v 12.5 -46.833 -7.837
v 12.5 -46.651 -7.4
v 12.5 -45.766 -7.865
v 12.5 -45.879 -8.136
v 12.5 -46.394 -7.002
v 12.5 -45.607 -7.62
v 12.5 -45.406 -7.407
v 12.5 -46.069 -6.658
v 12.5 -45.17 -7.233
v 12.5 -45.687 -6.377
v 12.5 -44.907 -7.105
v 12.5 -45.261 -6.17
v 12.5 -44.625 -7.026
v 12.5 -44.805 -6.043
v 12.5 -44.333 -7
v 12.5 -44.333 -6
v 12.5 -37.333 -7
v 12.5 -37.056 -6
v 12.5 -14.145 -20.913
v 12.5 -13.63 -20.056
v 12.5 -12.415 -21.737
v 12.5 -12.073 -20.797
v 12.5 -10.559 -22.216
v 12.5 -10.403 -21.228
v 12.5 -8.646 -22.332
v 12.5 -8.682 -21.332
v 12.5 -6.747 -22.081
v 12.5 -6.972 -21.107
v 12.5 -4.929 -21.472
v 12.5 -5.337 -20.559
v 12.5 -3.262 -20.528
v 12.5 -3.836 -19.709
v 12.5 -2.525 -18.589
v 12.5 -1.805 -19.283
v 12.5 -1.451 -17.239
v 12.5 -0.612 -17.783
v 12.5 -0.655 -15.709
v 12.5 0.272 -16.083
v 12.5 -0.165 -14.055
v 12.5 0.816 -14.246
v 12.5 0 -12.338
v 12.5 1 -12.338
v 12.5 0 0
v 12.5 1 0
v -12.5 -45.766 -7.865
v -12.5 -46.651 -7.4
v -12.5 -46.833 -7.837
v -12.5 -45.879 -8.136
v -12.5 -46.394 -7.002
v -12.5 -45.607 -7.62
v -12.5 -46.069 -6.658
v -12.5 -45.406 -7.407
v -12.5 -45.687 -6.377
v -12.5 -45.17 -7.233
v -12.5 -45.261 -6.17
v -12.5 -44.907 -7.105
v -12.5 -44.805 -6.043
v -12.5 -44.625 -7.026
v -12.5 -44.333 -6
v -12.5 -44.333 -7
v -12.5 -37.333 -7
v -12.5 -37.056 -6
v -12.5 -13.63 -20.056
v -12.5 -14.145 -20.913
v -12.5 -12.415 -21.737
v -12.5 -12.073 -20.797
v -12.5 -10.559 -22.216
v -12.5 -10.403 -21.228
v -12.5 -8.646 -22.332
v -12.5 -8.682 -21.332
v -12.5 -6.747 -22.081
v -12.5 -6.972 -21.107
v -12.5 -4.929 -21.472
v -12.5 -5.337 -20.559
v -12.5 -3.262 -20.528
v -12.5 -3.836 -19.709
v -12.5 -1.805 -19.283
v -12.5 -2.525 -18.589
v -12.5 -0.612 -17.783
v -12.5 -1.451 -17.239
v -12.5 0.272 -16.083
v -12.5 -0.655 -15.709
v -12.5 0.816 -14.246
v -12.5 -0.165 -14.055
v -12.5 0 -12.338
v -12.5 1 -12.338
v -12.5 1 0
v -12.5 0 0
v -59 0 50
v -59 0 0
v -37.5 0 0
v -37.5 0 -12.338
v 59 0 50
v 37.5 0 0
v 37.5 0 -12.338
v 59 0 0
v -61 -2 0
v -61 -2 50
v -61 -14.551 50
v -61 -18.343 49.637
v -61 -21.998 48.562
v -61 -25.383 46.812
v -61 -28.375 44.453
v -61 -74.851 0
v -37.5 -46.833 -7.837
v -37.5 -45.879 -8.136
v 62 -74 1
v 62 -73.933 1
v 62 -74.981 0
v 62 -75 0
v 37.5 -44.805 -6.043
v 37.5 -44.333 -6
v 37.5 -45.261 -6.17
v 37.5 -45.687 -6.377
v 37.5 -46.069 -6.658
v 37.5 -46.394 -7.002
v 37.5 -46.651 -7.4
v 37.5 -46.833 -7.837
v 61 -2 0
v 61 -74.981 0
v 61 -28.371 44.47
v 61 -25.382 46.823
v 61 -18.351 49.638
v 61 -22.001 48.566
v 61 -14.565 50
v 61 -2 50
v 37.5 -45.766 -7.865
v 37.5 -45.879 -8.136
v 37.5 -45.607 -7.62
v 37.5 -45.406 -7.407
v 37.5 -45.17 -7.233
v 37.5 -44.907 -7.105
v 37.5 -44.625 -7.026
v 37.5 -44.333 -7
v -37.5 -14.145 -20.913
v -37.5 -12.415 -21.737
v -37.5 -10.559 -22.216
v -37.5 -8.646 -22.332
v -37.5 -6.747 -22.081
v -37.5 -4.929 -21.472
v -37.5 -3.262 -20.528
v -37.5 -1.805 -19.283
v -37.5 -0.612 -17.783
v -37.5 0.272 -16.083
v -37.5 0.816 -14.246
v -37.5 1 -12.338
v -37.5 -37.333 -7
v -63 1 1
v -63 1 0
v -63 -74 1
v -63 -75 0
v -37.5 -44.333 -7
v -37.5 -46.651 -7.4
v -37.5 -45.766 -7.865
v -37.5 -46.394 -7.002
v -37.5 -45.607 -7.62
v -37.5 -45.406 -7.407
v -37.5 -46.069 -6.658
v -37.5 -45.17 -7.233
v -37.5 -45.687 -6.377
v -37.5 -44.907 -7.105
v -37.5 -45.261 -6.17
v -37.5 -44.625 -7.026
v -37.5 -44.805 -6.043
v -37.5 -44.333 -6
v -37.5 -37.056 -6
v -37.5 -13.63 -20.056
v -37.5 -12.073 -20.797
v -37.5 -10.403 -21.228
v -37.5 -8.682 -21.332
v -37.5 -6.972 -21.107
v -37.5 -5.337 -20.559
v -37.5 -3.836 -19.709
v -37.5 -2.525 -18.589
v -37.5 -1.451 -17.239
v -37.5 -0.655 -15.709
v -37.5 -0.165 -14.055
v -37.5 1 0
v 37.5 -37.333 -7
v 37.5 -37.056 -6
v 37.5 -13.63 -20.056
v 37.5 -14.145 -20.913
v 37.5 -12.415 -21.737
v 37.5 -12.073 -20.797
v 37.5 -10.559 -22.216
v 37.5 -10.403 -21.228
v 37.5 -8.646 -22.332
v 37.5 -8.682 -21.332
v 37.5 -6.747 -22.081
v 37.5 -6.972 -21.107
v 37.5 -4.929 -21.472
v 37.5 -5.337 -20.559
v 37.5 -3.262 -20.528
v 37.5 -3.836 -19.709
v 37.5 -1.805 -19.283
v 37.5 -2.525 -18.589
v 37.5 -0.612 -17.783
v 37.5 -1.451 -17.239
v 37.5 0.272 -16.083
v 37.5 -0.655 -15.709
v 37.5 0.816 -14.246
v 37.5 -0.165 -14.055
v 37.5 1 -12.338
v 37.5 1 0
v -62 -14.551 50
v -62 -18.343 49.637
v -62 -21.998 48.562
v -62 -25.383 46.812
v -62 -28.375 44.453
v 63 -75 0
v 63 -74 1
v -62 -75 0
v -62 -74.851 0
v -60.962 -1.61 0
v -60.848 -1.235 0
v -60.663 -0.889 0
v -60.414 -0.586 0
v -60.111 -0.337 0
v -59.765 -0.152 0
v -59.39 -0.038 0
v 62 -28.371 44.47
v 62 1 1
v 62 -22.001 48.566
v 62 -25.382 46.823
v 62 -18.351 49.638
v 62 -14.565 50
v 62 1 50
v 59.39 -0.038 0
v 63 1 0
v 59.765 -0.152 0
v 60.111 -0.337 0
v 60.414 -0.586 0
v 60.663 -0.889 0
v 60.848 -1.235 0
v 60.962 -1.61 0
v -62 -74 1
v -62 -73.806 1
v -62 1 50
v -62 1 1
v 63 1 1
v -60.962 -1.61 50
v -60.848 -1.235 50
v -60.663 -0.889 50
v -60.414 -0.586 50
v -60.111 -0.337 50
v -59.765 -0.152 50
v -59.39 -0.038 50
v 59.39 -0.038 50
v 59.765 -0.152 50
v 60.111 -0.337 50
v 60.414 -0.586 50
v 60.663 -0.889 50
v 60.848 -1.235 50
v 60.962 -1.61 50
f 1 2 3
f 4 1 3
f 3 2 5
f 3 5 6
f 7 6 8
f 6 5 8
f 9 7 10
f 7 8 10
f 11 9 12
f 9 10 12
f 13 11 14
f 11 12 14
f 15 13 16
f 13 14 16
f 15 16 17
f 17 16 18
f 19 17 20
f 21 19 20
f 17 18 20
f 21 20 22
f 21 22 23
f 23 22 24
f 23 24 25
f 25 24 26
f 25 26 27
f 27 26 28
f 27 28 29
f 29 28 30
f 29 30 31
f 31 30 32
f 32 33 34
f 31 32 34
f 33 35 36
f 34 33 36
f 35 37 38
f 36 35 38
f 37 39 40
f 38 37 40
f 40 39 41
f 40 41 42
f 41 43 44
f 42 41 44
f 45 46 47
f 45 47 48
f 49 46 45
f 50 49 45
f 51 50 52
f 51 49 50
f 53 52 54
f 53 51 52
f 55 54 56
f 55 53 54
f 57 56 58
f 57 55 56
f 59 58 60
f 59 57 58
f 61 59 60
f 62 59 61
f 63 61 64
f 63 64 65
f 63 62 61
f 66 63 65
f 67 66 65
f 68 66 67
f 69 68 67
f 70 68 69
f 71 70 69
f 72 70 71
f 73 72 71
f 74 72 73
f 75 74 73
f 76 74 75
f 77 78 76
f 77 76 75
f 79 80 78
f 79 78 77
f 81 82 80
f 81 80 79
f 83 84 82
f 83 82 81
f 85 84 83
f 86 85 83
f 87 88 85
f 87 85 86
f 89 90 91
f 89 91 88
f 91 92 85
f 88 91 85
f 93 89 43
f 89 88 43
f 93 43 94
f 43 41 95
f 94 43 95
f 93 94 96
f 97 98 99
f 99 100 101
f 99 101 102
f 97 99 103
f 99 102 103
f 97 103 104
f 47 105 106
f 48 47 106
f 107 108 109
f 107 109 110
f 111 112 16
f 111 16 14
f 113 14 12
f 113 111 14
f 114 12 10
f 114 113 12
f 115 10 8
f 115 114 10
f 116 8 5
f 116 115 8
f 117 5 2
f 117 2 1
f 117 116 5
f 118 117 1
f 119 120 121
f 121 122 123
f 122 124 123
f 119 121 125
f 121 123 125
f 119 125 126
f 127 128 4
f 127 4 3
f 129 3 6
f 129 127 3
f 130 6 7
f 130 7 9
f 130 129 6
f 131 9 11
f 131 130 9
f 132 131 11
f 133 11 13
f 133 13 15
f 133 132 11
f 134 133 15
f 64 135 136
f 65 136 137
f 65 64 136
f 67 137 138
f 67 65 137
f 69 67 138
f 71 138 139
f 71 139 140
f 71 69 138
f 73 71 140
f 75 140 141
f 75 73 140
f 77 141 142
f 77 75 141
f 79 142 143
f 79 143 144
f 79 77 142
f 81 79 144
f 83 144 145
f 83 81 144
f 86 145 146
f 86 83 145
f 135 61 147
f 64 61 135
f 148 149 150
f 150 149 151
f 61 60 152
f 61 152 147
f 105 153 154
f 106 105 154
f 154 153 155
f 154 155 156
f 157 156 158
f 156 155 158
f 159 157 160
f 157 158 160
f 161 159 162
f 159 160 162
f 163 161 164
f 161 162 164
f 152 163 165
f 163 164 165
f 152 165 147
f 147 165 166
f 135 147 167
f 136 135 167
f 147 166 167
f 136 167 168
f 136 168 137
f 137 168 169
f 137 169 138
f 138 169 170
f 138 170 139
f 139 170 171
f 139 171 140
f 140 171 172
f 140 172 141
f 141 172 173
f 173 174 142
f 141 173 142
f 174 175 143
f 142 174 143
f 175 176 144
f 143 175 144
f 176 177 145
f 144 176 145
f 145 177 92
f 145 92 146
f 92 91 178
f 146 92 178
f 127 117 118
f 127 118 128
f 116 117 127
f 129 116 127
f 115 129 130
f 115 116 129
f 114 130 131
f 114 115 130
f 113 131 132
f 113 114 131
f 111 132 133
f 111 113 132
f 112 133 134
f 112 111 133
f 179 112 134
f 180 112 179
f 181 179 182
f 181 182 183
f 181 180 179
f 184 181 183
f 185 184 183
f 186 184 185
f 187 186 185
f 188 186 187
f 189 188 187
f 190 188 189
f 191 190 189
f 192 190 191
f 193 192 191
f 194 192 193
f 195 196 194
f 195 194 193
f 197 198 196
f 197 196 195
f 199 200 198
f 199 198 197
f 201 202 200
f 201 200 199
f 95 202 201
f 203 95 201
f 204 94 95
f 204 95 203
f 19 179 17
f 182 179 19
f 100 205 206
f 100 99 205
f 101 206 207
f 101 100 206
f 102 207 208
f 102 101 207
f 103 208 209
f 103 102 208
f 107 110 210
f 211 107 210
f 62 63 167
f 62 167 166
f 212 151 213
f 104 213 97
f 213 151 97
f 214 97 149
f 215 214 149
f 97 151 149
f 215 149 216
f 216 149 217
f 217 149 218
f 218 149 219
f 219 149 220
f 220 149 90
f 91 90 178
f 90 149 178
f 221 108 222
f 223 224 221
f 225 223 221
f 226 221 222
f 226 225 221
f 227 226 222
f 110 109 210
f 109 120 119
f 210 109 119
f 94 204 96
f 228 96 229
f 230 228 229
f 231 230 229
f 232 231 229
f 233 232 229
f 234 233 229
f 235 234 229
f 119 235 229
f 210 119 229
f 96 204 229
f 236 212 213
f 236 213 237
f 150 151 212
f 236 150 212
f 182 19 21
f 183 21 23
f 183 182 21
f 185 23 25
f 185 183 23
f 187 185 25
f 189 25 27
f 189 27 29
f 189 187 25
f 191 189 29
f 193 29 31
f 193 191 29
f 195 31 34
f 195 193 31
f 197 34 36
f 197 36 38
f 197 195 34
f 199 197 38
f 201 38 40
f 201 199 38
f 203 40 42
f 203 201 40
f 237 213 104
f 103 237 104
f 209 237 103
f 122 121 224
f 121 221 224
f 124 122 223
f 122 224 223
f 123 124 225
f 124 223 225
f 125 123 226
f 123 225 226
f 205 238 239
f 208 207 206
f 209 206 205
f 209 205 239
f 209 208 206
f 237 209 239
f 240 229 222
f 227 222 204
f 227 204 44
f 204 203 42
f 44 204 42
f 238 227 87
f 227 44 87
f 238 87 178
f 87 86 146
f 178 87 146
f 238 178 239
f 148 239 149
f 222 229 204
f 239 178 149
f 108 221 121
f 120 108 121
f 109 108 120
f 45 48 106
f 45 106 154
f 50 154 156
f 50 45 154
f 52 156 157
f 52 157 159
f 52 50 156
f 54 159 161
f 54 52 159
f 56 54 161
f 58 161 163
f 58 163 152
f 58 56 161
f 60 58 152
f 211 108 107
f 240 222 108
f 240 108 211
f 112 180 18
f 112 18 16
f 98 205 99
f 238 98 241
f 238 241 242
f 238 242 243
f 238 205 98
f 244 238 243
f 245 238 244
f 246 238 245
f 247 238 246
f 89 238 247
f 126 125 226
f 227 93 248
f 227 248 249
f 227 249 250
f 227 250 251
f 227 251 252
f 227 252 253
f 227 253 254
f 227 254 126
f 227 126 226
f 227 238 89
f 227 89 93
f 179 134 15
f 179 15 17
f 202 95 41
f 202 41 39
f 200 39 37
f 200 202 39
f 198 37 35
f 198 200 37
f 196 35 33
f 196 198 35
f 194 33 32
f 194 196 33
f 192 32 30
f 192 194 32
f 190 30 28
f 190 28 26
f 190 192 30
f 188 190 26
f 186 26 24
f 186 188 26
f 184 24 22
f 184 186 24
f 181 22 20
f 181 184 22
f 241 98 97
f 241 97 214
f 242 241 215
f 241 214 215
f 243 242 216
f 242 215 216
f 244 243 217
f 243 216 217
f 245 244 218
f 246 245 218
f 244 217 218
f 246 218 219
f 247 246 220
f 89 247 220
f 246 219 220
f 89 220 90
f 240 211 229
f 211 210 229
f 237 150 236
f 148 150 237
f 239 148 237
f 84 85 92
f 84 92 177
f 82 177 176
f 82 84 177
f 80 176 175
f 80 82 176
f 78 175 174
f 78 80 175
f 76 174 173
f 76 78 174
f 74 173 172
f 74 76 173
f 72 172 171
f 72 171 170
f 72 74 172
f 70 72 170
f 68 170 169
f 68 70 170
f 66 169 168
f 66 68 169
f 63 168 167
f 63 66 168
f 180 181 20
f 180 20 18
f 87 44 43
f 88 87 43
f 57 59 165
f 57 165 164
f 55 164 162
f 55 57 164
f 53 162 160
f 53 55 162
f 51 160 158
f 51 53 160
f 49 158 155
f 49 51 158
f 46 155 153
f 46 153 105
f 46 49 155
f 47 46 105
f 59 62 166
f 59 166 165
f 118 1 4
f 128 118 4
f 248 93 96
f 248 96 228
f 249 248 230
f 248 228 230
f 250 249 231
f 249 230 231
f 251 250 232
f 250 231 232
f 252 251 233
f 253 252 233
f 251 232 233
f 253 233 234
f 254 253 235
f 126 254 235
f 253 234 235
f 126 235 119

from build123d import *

# Parameters (mm, degrees)
F1_DEPTH  = 50
F3_DEPTH  = 1
F5_DEPTH  = 1
F6_DEPTH  = 1
F7_SIZE   = 0.99999
F9_DEPTH  = 37.5
F10_DEPTH = 12.5
F11_R     = 20


# Not quite as in the source:
# - a fillet or chamfer is up to 0.001 mm smaller than in the source, because OpenCascade refuses the exact size


with BuildPart() as f1:
    # F0 (on Top) → F1 (new body)
    with BuildSketch(Plane.XY):
        with BuildLine():
            Line((-59, 0), (0, 0))
            Line((0, 0), (59, 0))
            ThreePointArc((59, 0), (60.4142135624, -0.5857864376), (61, -2))
            Line((61, -2), (61, -22.5753318518))
            Line((61, -22.5753318518), (62, -22.5753318518))
            Line((62, -22.5753318518), (62, 1))
            Line((62, 1), (0, 1))
            Line((0, 1), (-62, 1))
            Line((-62, 1), (-62, -22.5753318518))
            Line((-62, -22.5753318518), (-61, -22.5753318518))
            Line((-61, -22.5753318518), (-61, -2))
            ThreePointArc((-61, -2), (-60.4142135624, -0.5857864376), (-59, 0))
        make_face()
    extrude(amount=F1_DEPTH)

    # F2 (on face) → F3 (join)
    with BuildSketch(Plane(origin=(-62, 0, 0), x_dir=(0, -1, 0), z_dir=(-1, 0, 0))):
        Polygon((74.8511105776, 0), (22.5753318518, 50), (22.5753318518, 0), align=None)
    extrude(amount=-F3_DEPTH)

    # F4 (on face) → F5 (join)
    with BuildSketch(Plane.YZ.offset(62)):
        Polygon((-22.5753318518, 0), (-22.5753318518, 50), (-74.9809518456, 0), align=None)
    extrude(amount=-F5_DEPTH)

    # F0 (on Top) → F6 (join)
    with BuildSketch(Plane.XY):
        Polygon((62, 1), (62, -22.5753318518), (62, -75), (63, -75), (63, 1), align=None)
        Polygon((-62, -75), (-62, -22.5753318518), (-62, 1), (-63, 1), (-63, -75), align=None)
    extrude(amount=F6_DEPTH)

    # F7 (size 1 in the source; OpenCascade refuses exactly that, so slightly less here)
    f7_edges = [f1.edges().sort_by_distance(p)[0] for p in [
        (62.5, -75, 1),
        (-62.5, -75, 1),
    ]]
    chamfer(f7_edges, length=F7_SIZE)

    # F8 (on Right) → F9 (join, symmetric)
    with BuildSketch(Plane.YZ):
        with BuildLine():
            Line((1, -12.3380962103), (1, 0))
            Line((1, 0), (-6.78e-08, 0))
            Line((-6.78e-08, 0), (-6.78e-08, -12.3380962103))
            ThreePointArc((-6.78e-08, -12.3380962103), (-4.5657106986, -20.1698953121), (-13.6304617639, -20.0555324836))
            Line((-13.6304617639, -20.0555324836), (-37.0563493496, -5.9999999322))
            Line((-37.0563493496, -5.9999999322), (-44.3333333333, -5.9999999322))
            ThreePointArc((-44.3333333333, -5.9999999322), (-45.8844675886, -6.5087526502), (-46.8329720249, -7.8373557287))
            Line((-46.8329720249, -7.8373557287), (-45.8785471313, -8.1358071621))
            ThreePointArc((-45.8785471313, -8.1358071621), (-45.2922055343, -7.3144981402), (-44.3333333333, -7))
            Line((-44.3333333333, -7), (-37.3333333333, -7))
            Line((-37.3333333333, -7), (-14.1449575543, -20.9130254674))
            ThreePointArc((-14.1449575543, -20.9130254674), (-4.0730118502, -21.0400952778), (1, -12.3380962103))
        make_face()
    extrude(amount=F9_DEPTH, both=True)

    # F8 (on Right) → F10 (cut, symmetric)
    with BuildSketch(Plane.YZ):
        with BuildLine():
            Line((1, -12.3380962103), (1, 0))
            Line((1, 0), (-6.78e-08, 0))
            Line((-6.78e-08, 0), (-6.78e-08, -12.3380962103))
            ThreePointArc((-6.78e-08, -12.3380962103), (-4.5657106986, -20.1698953121), (-13.6304617639, -20.0555324836))
            Line((-13.6304617639, -20.0555324836), (-37.0563493496, -5.9999999322))
            Line((-37.0563493496, -5.9999999322), (-44.3333333333, -5.9999999322))
            ThreePointArc((-44.3333333333, -5.9999999322), (-45.8844675886, -6.5087526502), (-46.8329720249, -7.8373557287))
            Line((-46.8329720249, -7.8373557287), (-45.8785471313, -8.1358071621))
            ThreePointArc((-45.8785471313, -8.1358071621), (-45.2922055343, -7.3144981402), (-44.3333333333, -7))
            Line((-44.3333333333, -7), (-37.3333333333, -7))
            Line((-37.3333333333, -7), (-14.1449575543, -20.9130254674))
            ThreePointArc((-14.1449575543, -20.9130254674), (-4.0730118502, -21.0400952778), (1, -12.3380962103))
        make_face()
    extrude(amount=F10_DEPTH, both=True, mode=Mode.SUBTRACT)

    # F11
    f11_edges = [f1.edges().sort_by_distance(p)[0] for p in [
        (-61.5, -22.575332, 50),
        (61.5, -22.575332, 50),
    ]]
    fillet(f11_edges, radius=F11_R)


solid = f1.part
